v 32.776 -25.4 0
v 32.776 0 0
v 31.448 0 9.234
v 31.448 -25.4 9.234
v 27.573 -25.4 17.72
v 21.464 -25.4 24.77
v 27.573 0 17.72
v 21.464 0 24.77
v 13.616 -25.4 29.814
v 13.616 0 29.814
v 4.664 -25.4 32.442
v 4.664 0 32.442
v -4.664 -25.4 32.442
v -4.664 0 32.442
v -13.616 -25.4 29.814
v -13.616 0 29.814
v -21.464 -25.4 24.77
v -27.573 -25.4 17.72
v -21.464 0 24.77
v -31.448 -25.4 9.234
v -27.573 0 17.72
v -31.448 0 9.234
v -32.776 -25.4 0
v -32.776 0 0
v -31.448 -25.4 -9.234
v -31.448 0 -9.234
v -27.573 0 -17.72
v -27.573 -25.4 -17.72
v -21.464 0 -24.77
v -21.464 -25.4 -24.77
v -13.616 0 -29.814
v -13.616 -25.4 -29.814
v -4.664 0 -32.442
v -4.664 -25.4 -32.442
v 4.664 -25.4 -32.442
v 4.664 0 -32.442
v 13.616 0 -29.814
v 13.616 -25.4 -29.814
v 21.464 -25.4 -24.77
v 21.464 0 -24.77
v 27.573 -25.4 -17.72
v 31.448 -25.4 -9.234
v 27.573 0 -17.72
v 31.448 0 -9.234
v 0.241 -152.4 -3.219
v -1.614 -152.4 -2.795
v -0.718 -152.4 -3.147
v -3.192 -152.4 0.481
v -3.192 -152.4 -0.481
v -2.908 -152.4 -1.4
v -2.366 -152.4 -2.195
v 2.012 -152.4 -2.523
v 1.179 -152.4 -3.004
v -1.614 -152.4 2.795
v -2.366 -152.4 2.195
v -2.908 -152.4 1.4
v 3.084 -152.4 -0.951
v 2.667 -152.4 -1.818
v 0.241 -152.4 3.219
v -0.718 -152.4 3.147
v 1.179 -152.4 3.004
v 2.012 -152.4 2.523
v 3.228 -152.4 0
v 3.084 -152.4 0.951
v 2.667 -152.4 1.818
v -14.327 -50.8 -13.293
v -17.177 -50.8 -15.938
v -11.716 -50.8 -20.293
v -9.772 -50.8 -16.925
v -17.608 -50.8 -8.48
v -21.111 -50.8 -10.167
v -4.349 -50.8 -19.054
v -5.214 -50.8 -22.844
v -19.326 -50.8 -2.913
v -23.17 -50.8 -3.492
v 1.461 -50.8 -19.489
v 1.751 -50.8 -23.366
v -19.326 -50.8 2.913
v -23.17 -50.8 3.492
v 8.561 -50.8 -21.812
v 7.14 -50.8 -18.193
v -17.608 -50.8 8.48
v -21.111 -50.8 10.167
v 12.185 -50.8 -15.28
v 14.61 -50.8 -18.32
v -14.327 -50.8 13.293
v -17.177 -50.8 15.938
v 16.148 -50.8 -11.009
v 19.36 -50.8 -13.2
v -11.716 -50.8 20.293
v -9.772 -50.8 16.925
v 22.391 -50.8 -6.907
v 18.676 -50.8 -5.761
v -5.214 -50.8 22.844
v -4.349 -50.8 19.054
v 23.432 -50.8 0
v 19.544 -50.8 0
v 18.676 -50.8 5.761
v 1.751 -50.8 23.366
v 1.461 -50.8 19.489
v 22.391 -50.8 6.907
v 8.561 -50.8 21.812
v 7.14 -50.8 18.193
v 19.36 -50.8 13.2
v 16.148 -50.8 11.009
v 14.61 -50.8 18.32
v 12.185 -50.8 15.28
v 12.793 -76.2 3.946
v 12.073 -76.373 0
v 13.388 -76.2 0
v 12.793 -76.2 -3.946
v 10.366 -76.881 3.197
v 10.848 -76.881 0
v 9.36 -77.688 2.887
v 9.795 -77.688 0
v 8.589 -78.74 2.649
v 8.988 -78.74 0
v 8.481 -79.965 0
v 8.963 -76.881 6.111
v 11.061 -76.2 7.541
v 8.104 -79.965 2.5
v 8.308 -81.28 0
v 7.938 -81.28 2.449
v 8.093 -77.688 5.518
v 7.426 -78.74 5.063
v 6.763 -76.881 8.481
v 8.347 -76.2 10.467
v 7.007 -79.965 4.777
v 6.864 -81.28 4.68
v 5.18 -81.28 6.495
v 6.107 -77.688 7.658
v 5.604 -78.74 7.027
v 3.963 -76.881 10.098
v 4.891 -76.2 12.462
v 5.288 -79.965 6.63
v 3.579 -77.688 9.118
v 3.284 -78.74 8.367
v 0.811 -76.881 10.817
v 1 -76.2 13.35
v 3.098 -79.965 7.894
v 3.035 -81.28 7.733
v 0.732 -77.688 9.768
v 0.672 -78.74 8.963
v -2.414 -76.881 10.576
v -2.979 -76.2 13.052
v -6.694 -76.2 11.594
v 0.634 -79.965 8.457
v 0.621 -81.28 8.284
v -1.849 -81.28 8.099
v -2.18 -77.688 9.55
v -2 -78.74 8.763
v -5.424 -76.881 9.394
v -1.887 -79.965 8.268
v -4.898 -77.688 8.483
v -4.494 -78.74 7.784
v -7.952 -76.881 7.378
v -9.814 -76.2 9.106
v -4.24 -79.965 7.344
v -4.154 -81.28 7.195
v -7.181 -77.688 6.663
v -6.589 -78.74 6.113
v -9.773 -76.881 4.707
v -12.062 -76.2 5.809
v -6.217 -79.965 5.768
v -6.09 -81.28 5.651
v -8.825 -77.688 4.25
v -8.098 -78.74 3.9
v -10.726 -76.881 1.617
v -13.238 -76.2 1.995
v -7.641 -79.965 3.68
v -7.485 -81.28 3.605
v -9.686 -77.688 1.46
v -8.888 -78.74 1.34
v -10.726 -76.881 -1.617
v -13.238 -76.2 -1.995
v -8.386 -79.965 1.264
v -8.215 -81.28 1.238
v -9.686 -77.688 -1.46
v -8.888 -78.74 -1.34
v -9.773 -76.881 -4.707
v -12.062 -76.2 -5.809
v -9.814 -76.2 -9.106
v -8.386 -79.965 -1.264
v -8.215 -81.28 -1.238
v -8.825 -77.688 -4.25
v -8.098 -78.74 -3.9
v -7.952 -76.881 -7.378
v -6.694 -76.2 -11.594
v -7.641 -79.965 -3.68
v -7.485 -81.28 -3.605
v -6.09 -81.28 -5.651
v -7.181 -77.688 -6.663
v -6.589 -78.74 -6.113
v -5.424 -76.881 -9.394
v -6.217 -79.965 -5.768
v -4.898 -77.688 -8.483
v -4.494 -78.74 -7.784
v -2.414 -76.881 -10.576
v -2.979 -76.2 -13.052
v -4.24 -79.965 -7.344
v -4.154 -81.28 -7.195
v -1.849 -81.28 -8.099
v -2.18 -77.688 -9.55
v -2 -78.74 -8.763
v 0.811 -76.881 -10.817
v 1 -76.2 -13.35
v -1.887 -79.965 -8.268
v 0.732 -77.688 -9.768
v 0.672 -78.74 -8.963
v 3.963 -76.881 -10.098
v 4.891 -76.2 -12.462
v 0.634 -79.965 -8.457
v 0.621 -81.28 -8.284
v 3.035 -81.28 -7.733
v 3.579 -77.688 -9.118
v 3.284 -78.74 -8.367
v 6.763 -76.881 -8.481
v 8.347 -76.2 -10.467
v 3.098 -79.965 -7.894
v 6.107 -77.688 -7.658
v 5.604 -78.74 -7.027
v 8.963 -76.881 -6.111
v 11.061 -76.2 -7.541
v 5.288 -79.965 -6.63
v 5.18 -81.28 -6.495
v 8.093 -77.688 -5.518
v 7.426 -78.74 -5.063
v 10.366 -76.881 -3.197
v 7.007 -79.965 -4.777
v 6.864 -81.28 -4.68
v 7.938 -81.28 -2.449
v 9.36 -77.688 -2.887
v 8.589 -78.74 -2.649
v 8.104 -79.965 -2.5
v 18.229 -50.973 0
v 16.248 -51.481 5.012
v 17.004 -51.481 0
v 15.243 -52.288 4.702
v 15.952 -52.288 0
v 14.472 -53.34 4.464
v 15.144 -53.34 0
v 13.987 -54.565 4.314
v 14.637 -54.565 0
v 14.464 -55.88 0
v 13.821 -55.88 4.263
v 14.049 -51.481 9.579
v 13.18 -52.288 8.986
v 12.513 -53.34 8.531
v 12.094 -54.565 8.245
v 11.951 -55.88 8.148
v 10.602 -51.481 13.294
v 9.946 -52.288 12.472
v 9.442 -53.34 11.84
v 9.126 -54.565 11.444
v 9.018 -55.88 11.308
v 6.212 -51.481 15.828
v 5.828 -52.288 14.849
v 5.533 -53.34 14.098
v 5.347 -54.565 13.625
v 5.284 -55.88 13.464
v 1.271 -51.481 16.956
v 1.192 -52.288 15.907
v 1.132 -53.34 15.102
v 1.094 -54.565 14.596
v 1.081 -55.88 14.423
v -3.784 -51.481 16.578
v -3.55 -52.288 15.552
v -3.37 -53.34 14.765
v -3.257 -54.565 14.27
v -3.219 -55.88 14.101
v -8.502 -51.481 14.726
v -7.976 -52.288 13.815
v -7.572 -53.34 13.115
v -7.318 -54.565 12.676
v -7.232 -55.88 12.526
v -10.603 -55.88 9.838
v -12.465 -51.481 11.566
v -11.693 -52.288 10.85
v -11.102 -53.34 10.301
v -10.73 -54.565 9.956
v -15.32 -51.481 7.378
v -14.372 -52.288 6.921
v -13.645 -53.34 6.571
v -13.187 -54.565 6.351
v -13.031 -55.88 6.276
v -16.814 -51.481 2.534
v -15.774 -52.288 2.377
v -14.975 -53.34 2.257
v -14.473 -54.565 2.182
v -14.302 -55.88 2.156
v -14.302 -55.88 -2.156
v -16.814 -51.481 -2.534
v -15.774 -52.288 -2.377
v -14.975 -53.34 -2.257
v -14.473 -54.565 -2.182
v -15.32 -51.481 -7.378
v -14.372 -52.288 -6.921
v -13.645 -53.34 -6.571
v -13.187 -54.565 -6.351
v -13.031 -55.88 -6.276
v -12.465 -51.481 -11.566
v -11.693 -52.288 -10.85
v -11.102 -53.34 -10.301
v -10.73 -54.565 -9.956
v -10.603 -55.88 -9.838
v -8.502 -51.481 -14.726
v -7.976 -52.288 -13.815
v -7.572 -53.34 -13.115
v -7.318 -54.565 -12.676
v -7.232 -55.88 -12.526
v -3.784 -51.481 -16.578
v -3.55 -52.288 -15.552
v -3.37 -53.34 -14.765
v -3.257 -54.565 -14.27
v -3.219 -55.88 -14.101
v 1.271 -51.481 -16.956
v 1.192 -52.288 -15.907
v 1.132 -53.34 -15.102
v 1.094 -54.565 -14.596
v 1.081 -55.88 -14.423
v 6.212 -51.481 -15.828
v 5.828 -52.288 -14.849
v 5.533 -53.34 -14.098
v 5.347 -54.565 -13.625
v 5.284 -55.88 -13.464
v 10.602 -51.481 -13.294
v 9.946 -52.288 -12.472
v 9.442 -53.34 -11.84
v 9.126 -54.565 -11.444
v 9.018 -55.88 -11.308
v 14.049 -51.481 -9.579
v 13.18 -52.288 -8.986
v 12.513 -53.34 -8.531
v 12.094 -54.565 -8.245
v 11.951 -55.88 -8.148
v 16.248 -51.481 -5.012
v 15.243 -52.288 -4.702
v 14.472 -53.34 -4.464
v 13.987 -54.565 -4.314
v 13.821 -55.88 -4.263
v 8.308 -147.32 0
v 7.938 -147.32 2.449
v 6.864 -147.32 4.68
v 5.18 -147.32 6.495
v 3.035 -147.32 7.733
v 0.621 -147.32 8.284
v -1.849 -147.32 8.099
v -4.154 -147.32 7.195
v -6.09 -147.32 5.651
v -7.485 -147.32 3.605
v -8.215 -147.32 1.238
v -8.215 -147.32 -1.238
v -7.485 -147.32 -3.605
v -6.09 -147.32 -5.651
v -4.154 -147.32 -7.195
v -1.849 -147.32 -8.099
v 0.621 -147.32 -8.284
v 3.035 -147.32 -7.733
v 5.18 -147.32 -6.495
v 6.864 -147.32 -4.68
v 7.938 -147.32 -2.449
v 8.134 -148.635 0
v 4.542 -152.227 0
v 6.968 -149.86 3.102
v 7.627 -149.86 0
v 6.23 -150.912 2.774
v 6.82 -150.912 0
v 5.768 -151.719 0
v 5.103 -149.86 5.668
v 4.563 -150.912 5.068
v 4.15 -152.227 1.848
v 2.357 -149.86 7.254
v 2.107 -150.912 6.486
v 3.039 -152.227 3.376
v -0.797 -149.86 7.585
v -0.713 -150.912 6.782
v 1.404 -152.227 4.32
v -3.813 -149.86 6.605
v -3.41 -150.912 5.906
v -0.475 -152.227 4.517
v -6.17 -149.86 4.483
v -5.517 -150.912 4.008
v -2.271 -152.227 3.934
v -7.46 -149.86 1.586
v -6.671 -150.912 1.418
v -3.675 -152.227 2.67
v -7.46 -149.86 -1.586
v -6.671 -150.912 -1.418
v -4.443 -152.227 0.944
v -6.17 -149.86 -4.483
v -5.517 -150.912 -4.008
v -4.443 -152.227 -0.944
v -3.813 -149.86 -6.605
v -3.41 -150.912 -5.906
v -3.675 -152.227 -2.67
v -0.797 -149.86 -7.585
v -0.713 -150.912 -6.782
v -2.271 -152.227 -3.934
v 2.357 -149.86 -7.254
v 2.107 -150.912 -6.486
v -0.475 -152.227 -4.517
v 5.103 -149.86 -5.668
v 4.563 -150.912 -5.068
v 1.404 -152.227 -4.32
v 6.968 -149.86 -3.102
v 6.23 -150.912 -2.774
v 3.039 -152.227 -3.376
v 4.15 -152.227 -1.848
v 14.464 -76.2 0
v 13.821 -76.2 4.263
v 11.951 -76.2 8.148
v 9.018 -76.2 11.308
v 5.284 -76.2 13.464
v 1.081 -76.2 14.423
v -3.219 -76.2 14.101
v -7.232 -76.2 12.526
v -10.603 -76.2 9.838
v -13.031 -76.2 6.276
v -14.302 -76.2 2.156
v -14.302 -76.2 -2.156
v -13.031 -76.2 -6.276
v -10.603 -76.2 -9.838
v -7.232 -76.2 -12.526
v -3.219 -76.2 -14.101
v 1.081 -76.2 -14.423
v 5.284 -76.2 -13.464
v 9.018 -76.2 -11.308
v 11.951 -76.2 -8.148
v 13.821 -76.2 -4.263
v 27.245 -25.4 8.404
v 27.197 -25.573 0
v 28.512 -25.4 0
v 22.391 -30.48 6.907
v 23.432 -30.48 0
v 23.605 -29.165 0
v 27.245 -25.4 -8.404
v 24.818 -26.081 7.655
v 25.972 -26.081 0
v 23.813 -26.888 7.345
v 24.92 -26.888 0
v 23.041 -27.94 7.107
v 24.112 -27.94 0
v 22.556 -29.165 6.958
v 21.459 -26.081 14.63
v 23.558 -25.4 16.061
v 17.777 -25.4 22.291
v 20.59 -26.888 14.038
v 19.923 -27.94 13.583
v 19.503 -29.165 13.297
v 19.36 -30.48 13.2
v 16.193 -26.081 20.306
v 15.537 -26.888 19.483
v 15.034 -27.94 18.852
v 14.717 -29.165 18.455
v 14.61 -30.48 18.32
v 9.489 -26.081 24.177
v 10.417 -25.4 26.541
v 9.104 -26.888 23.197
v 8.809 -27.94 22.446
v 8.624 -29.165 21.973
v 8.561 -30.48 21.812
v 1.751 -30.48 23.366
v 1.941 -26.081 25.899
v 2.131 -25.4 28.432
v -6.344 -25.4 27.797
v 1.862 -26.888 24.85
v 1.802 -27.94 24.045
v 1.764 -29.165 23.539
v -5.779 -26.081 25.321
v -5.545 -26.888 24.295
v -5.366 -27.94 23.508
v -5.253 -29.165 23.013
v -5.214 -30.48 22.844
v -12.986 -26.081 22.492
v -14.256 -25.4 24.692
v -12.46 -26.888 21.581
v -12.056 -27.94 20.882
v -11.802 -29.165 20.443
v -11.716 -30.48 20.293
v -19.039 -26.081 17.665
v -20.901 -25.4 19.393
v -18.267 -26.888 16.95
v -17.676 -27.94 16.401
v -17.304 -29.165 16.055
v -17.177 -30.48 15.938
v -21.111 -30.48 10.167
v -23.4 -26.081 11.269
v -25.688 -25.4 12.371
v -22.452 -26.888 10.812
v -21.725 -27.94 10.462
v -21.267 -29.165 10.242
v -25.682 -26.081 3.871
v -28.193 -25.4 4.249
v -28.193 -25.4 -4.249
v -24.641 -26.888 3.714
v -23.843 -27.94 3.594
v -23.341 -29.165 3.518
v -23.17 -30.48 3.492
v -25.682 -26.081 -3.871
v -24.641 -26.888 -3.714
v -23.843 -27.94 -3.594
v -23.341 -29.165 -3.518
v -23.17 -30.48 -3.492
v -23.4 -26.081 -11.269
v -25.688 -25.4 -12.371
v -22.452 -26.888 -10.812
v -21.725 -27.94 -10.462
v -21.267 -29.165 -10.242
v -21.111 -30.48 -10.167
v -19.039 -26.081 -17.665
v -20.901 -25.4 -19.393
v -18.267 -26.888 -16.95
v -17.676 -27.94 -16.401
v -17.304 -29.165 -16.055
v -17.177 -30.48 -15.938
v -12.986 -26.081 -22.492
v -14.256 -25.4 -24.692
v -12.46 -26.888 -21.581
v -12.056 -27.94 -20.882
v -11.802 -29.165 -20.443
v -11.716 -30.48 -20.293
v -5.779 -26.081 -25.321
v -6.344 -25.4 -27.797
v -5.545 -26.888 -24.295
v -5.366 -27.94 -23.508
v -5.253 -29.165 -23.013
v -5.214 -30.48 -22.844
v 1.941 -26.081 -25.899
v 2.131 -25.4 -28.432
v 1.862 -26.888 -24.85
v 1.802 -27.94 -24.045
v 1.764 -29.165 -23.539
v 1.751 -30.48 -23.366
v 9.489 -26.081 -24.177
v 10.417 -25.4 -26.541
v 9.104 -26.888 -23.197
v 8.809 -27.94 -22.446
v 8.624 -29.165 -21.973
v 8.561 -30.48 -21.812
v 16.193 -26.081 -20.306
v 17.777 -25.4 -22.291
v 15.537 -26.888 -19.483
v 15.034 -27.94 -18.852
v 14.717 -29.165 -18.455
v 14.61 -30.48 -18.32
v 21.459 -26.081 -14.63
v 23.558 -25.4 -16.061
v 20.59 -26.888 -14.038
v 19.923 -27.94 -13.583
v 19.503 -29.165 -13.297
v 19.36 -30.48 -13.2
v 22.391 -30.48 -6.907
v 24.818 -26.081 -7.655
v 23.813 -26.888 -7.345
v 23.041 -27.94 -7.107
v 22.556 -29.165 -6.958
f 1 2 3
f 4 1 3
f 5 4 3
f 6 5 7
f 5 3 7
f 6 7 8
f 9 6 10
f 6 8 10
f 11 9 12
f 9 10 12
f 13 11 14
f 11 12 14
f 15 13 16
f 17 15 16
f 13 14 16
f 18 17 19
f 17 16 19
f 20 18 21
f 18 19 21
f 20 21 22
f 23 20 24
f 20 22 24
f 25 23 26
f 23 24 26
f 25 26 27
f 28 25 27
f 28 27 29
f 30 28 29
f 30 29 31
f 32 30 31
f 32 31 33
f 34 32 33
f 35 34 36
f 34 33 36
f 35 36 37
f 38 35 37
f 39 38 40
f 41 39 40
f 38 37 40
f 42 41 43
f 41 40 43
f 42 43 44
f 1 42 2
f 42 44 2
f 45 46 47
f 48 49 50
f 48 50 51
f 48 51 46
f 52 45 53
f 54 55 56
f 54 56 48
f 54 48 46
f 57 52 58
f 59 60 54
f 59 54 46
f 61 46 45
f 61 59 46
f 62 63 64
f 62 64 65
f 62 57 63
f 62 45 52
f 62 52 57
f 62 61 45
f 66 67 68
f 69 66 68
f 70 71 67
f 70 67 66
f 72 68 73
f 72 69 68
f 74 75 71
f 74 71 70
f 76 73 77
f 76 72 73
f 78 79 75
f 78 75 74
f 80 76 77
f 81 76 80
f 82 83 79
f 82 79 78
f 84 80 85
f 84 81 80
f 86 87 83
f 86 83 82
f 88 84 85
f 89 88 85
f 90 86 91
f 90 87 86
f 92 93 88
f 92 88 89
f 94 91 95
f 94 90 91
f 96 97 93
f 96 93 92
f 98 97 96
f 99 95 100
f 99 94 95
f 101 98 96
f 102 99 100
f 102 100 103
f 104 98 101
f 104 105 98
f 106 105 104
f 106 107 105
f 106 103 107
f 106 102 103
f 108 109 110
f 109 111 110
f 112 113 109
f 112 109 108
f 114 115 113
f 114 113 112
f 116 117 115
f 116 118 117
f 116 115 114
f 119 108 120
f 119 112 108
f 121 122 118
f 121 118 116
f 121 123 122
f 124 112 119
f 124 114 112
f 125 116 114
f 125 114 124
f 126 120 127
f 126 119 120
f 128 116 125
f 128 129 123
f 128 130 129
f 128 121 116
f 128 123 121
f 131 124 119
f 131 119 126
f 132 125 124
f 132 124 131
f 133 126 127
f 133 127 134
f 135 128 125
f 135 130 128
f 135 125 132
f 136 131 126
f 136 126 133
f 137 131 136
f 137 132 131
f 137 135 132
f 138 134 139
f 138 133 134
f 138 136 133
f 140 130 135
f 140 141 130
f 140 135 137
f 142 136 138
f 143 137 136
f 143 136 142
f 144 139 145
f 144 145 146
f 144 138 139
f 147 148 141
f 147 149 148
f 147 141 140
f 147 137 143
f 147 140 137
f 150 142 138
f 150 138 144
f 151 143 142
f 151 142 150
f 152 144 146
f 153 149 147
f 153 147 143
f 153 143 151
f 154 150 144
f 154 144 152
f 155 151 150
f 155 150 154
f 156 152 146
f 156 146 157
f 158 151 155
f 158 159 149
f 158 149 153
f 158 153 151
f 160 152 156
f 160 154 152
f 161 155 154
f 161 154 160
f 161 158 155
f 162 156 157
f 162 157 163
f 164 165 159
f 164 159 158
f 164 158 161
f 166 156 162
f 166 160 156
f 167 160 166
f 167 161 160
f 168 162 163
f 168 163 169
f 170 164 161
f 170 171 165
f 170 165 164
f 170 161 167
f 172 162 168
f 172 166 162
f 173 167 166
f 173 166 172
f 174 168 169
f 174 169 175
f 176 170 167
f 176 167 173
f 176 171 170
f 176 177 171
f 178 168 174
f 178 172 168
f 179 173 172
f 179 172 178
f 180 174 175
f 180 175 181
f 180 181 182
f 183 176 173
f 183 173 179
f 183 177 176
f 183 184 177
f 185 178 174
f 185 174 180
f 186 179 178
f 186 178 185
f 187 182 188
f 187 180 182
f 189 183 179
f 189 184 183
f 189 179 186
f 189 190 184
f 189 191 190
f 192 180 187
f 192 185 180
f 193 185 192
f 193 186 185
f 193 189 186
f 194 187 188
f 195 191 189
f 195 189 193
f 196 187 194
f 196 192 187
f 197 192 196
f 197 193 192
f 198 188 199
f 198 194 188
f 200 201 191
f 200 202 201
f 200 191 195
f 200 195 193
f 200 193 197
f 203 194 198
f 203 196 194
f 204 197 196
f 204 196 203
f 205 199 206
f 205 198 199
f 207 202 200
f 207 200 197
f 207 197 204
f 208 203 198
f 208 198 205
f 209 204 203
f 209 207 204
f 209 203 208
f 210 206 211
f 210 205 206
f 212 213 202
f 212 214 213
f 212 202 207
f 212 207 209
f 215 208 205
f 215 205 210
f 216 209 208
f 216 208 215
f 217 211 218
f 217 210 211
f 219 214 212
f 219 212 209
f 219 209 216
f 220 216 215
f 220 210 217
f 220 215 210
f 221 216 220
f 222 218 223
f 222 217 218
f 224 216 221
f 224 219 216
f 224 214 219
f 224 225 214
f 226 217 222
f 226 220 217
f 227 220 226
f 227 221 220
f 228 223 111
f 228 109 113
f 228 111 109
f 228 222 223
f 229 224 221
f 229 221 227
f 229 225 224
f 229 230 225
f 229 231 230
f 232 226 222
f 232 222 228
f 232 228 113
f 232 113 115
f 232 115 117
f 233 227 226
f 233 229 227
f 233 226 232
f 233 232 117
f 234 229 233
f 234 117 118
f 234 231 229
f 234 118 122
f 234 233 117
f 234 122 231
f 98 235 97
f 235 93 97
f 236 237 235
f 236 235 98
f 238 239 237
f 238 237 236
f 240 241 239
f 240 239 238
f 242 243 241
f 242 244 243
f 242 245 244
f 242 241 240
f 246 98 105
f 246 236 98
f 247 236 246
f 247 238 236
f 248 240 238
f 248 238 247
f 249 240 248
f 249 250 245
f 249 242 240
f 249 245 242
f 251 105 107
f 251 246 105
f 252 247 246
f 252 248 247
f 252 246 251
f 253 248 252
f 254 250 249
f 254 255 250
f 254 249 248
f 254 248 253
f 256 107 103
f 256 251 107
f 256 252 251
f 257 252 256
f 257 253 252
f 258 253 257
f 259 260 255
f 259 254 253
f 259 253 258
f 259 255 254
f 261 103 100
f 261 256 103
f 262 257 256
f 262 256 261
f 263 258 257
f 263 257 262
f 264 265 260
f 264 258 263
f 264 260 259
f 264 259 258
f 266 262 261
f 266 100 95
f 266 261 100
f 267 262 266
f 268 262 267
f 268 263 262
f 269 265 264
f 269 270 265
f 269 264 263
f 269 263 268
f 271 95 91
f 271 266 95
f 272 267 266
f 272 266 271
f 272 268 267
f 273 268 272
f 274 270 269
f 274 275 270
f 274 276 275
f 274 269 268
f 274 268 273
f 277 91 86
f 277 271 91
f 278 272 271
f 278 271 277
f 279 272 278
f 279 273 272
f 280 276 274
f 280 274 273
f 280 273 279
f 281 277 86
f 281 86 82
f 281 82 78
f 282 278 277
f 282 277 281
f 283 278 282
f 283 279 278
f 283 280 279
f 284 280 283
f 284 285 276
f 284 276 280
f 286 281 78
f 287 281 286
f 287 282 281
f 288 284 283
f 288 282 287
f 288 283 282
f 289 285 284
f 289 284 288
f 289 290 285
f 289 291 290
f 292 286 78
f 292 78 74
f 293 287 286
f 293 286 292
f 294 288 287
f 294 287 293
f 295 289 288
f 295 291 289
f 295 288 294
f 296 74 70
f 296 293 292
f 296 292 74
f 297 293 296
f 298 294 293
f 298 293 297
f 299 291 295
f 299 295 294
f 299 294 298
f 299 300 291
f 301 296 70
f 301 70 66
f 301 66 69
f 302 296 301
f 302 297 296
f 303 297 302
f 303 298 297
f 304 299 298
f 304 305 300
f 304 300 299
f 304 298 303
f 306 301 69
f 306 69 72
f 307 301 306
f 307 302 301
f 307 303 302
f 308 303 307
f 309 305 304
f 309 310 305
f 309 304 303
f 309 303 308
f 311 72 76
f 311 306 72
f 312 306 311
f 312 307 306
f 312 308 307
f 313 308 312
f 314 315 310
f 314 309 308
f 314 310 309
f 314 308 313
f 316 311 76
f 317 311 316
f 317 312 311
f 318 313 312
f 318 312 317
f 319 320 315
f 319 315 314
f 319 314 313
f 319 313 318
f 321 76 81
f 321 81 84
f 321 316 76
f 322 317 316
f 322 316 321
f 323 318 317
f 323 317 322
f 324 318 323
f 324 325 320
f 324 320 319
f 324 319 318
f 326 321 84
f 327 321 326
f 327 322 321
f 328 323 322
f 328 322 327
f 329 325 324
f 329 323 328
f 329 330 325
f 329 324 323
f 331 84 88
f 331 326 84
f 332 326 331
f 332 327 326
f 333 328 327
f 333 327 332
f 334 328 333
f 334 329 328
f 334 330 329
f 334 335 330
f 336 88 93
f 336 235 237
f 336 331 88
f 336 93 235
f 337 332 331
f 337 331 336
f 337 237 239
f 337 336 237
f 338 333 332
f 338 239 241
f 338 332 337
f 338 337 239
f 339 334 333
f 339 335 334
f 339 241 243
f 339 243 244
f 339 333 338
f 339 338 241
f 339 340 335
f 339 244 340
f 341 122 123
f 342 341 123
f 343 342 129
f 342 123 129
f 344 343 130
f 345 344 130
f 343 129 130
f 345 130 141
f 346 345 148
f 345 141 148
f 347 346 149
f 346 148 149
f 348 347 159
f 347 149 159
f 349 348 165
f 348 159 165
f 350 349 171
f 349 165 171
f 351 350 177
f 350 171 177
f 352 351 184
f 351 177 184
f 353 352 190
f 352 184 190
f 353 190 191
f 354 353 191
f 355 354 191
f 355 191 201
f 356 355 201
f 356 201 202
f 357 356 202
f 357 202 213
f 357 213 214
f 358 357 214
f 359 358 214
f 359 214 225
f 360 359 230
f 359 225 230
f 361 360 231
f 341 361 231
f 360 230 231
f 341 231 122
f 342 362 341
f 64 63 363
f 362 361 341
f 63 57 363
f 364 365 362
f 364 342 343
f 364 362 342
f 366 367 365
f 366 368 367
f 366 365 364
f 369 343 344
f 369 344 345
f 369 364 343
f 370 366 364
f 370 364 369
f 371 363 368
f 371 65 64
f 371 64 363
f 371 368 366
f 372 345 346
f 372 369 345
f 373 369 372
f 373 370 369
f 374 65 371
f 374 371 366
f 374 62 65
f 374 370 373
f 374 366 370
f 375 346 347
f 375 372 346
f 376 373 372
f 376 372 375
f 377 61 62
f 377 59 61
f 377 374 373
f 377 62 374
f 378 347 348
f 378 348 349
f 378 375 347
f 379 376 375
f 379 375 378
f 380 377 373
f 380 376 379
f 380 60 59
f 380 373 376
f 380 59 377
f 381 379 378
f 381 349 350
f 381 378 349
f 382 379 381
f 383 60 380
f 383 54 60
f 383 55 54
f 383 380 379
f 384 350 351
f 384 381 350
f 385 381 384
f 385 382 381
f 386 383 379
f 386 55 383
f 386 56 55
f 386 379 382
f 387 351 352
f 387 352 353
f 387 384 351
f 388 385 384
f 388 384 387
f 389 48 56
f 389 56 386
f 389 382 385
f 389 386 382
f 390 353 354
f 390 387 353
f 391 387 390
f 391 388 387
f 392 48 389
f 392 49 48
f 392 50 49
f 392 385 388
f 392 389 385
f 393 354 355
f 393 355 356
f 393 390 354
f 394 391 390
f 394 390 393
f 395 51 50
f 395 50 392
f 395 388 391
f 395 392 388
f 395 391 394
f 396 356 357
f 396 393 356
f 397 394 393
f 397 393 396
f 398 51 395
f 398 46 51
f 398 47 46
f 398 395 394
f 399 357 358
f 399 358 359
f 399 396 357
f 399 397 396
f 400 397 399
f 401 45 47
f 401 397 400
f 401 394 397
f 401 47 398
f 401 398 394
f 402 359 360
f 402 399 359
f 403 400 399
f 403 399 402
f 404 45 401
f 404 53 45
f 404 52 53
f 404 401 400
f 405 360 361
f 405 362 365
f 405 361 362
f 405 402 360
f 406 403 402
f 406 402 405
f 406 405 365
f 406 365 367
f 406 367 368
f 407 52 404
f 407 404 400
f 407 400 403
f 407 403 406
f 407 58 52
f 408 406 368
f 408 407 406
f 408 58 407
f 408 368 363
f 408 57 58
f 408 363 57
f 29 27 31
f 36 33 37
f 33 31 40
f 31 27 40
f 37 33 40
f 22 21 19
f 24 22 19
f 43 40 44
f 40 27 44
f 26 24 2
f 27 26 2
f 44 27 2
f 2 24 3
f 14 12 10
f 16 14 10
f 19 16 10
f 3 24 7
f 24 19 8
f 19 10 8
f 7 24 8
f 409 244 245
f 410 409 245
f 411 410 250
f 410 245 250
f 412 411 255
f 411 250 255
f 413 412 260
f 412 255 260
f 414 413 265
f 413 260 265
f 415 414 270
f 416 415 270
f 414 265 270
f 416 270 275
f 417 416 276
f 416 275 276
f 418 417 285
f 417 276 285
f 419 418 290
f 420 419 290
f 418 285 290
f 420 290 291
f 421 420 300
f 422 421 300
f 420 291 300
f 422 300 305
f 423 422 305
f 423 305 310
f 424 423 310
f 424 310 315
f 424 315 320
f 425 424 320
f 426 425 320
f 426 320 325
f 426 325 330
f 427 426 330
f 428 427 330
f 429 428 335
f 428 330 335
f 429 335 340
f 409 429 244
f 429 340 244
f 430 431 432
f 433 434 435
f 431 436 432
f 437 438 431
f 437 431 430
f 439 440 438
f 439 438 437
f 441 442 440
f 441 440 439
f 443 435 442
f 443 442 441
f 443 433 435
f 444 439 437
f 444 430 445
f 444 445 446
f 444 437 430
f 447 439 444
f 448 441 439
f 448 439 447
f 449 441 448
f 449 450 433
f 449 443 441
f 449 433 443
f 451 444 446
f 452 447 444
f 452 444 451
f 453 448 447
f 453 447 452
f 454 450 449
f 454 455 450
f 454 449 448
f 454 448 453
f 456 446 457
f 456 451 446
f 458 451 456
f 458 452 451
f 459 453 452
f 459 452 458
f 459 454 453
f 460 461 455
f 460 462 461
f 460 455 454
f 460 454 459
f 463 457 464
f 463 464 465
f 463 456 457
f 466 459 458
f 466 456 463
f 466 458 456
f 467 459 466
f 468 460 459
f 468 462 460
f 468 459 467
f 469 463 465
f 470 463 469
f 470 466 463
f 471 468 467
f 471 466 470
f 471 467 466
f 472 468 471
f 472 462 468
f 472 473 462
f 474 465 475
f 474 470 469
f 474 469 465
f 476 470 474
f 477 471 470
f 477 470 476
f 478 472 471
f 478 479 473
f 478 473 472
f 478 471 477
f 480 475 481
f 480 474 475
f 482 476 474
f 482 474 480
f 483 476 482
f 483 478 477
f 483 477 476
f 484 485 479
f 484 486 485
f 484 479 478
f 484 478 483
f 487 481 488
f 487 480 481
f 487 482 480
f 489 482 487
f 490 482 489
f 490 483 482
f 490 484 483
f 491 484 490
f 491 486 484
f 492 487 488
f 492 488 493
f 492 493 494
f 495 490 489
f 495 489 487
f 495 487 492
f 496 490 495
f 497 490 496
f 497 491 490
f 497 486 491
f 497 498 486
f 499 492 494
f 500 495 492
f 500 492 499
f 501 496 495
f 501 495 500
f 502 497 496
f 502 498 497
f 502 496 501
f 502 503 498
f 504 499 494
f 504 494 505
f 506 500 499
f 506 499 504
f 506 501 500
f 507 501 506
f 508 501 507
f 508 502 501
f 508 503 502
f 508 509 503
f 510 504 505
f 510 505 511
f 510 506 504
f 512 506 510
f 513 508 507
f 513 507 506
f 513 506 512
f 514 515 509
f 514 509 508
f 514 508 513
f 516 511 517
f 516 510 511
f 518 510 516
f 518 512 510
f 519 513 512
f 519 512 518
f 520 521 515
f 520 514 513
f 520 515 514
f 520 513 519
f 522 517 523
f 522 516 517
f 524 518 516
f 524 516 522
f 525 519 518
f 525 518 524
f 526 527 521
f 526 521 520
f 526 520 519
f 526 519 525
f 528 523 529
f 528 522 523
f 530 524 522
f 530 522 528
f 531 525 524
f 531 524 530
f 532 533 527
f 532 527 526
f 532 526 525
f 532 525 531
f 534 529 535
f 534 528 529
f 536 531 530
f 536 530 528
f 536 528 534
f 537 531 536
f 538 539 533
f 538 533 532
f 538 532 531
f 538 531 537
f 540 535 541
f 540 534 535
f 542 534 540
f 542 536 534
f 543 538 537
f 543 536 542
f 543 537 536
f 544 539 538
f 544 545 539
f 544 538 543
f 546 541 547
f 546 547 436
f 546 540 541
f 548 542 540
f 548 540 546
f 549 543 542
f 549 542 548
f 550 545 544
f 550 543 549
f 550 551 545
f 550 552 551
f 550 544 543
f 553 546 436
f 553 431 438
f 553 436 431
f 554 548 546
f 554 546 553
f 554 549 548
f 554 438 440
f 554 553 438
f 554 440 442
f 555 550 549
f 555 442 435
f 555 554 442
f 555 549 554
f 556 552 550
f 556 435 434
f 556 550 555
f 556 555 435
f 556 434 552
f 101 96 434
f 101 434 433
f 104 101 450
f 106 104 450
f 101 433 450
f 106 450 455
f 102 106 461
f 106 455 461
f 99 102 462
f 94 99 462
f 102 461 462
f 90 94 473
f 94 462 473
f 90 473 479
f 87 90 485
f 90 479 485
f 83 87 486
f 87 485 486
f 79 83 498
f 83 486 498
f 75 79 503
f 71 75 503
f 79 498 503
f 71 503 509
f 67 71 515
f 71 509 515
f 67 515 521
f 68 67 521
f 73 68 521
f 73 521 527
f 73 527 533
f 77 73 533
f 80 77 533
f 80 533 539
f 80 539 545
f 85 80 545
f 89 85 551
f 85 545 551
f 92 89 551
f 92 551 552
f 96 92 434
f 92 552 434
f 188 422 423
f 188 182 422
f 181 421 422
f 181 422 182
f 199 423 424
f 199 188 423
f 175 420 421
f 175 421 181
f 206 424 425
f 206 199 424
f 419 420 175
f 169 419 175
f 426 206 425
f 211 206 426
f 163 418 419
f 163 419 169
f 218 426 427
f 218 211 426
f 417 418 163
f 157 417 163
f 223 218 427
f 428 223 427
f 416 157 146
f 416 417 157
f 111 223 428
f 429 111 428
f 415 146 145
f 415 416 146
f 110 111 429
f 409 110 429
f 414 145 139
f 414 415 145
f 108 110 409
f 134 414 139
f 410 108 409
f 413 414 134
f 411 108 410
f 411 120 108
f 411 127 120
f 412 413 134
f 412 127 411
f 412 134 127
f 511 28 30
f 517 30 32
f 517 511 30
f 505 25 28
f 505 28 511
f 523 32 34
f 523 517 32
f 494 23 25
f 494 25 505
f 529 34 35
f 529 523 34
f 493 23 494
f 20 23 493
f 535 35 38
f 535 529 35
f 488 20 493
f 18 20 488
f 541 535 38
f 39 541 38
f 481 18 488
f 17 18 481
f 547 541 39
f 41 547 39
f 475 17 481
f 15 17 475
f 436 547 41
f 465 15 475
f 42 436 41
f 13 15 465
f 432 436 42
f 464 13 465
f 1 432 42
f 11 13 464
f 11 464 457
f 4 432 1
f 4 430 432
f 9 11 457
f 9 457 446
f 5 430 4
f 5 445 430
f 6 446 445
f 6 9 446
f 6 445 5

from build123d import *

# Parameters (mm, degrees)
F0_R     = 32.775689
F1_DEPTH = 25.4
F2_R     = 23.431872
F3_DEPTH = 25.4
F4_R     = 14.46384
F5_DEPTH = 25.4
F6_R     = 8.307558
F7_DEPTH = 76.2
F8_R     = 5.08


with BuildPart() as f1:
    # F0 (on Front) → F1 (new body)
    with BuildSketch(Plane.XZ):
        Circle(F0_R)
    extrude(amount=F1_DEPTH)

    # F2 (on face) → F3 (join)
    with BuildSketch(Plane.XZ.offset(25.4)):
        Circle(F2_R)
    extrude(amount=F3_DEPTH)

    # F4 (on face) → F5 (join)
    with BuildSketch(Plane.XZ.offset(50.8)):
        Circle(F4_R)
    extrude(amount=F5_DEPTH)

    # F6 (on face) → F7 (join)
    with BuildSketch(Plane.XZ.offset(76.2)):
        Circle(F6_R)
    extrude(amount=F7_DEPTH)

    # F8
    f8_edges = [f1.edges().sort_by_distance(p)[0] for p in [
        (-23.431872, -25.4, 0),
        (-14.46384, -50.8, 0),
        (-8.307558, -76.2, 0),
        (-8.307558, -152.4, 0),
    ]]
    fillet(f8_edges, radius=F8_R)


solid = f1.part
